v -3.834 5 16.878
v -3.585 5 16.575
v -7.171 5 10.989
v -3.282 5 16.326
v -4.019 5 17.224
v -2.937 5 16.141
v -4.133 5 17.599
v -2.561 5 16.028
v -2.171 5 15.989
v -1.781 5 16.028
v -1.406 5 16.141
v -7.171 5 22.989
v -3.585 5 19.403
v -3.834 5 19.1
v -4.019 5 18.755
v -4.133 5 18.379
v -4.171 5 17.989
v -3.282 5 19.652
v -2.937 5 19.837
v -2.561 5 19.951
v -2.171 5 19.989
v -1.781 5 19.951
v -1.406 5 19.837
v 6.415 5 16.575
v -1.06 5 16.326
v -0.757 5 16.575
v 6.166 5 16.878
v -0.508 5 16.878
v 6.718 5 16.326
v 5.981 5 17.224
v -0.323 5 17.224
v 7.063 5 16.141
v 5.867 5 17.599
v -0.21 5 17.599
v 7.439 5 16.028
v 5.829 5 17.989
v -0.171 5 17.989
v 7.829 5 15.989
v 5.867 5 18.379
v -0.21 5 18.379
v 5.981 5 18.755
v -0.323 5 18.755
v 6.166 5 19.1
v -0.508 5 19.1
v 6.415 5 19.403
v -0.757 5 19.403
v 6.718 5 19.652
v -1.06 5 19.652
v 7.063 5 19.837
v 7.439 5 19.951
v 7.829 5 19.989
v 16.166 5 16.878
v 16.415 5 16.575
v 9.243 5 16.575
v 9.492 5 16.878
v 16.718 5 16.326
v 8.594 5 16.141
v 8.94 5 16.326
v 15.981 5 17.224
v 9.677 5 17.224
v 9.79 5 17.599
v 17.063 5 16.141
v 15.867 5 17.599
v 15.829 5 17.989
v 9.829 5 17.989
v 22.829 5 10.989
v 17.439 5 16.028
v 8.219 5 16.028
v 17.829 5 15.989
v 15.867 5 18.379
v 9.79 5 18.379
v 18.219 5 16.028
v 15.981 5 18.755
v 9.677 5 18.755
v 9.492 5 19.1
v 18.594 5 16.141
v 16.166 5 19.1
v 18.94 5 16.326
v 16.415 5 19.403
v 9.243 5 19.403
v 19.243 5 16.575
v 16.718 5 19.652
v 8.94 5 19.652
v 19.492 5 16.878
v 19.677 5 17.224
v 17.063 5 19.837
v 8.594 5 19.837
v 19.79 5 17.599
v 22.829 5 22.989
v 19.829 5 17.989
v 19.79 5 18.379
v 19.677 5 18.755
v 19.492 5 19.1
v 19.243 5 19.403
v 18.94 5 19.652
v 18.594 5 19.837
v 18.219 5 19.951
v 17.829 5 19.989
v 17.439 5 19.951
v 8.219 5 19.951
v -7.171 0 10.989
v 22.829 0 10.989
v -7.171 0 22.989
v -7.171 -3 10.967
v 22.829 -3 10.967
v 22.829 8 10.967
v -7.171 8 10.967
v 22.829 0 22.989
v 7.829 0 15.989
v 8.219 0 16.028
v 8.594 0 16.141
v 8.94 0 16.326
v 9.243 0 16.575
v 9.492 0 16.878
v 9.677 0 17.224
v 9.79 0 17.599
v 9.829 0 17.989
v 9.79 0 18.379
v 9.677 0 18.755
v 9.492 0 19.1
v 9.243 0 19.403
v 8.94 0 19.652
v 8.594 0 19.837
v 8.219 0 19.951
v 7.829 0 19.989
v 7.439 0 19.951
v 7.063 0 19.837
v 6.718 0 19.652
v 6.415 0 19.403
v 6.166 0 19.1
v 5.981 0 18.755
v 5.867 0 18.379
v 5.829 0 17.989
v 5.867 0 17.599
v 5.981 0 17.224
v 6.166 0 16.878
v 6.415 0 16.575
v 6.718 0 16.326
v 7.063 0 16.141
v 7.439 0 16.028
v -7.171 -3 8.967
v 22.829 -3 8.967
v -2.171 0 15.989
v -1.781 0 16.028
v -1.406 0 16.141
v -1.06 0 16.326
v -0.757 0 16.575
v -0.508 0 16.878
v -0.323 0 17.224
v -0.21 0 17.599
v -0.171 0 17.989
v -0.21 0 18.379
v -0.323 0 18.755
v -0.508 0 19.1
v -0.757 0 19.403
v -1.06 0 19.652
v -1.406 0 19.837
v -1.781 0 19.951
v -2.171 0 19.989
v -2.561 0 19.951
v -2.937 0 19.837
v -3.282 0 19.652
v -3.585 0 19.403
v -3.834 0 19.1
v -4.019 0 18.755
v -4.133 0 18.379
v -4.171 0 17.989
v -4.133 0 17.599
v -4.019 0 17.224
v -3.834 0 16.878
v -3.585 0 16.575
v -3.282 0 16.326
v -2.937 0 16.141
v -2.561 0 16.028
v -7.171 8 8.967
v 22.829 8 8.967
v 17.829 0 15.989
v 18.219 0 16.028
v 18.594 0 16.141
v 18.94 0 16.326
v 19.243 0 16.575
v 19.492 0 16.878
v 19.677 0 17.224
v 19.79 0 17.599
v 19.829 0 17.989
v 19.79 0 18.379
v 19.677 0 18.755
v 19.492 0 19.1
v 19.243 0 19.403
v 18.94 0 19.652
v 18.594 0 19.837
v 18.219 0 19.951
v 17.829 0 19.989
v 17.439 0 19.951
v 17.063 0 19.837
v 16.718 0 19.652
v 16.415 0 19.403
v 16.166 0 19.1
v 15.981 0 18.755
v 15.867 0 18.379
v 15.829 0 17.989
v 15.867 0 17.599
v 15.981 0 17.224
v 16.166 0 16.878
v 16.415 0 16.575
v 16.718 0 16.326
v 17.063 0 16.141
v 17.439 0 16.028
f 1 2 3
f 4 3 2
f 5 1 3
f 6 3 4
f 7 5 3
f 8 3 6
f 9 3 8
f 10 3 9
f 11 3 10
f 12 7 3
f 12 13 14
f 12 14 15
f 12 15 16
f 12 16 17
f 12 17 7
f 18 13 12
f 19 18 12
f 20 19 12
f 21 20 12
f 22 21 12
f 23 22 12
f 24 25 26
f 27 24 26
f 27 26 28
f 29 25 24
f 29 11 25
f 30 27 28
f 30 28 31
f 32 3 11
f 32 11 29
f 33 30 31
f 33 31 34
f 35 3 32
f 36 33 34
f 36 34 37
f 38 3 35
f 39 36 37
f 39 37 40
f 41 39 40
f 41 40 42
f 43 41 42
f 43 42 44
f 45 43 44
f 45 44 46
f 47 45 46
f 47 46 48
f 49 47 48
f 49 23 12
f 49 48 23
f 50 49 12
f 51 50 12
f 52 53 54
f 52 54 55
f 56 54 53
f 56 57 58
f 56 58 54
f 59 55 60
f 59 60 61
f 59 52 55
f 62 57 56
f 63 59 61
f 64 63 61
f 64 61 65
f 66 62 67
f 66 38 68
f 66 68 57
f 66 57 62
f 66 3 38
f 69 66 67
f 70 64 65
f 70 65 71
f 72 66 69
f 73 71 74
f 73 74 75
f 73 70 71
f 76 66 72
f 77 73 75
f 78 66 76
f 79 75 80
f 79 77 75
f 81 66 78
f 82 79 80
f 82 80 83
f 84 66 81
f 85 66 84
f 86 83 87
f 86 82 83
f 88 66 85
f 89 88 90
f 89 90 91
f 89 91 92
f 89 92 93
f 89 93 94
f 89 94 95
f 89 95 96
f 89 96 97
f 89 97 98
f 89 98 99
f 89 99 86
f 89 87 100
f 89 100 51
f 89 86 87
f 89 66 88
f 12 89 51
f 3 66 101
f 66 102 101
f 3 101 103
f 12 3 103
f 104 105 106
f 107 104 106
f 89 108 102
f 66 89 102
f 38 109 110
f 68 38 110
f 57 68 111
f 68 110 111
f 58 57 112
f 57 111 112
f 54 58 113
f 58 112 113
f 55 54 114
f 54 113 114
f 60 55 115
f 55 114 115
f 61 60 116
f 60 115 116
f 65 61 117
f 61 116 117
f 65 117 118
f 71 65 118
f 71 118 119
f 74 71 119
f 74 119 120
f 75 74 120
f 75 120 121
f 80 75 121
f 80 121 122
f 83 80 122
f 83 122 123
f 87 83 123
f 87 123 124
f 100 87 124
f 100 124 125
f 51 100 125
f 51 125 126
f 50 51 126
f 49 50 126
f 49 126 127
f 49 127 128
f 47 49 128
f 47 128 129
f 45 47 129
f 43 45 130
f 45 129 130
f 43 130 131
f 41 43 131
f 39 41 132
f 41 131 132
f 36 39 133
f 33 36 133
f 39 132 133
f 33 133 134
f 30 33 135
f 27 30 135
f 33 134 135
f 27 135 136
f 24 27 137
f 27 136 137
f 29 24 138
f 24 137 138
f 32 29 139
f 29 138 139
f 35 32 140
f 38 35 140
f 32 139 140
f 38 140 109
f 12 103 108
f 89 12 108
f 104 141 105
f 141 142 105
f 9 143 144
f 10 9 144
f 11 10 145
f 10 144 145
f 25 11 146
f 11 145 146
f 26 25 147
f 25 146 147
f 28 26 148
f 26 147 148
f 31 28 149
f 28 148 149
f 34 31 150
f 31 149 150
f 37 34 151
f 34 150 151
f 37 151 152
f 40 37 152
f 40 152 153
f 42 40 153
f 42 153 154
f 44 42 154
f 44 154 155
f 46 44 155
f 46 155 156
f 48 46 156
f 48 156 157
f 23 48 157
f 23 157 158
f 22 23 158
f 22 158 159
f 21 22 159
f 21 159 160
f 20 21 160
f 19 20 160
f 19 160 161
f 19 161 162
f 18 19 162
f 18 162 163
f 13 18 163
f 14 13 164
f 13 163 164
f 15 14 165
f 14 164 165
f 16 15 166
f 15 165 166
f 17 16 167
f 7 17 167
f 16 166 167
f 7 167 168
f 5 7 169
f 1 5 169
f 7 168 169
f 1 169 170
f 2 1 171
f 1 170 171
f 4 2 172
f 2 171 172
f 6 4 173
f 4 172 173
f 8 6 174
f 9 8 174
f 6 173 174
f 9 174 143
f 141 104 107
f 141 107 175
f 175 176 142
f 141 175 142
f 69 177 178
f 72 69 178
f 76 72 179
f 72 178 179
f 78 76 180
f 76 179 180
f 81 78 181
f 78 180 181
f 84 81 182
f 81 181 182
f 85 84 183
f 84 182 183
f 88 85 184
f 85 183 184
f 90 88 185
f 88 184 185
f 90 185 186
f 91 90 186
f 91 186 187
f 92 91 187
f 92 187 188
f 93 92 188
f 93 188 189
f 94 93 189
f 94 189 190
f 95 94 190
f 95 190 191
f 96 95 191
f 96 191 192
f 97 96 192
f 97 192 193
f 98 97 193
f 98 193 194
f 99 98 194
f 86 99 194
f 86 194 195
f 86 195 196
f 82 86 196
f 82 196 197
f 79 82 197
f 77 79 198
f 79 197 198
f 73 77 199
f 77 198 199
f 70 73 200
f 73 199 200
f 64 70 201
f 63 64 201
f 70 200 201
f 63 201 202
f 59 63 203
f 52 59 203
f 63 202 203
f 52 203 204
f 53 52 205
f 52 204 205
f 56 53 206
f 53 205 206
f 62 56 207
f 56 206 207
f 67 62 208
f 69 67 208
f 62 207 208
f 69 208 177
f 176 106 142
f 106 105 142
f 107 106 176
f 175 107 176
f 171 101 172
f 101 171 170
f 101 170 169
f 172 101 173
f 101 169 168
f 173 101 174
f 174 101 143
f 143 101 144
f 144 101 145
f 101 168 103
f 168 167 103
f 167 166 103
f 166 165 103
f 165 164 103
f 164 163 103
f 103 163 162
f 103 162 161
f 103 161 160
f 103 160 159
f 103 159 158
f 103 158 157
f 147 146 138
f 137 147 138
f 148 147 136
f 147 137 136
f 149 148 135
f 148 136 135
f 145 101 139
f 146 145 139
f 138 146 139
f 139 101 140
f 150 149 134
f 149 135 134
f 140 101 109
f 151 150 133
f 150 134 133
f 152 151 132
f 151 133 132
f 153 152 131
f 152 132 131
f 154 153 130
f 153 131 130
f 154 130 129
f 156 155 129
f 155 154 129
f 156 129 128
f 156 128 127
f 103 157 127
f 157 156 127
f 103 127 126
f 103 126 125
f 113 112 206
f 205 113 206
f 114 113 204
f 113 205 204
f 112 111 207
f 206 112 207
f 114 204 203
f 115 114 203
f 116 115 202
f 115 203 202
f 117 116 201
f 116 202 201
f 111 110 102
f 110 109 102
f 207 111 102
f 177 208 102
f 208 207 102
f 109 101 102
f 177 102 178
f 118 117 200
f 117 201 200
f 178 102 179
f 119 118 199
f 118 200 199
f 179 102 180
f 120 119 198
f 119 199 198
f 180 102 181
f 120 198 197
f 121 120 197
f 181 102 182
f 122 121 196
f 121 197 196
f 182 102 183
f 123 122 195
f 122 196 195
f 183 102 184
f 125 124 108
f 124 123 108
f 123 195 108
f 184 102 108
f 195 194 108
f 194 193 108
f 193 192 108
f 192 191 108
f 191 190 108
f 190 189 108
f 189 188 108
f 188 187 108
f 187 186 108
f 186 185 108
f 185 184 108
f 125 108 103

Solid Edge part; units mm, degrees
sketch "Sketch1" plane through (0, 0, 0) normal (0, -1, 0) x (1, 0, 0)
  line L0 (-7.1712, 22.9892) -> (22.8288, 22.9892)
  line L1 (22.8288, 22.9892) -> (22.8288, 10.9892)
  line L2 (22.8288, 10.9892) -> (-7.1712, 10.9892)
  line L3 (-7.1712, 10.9892) -> (-7.1712, 22.9892)
  dimension "D1" = 30
  dimension "D2" = 12
extrude "Protrusion1" add sketch "Sketch1" against normal blind 5
hole "Bohrung_1" at (-2.1712, 0, 17.9892) direction (0, 1, 0) diameter 4 end up to next
hole "Hole1" at (7.8288, 0, 17.9892) direction (0, 1, 0) diameter 4 end up to next
hole "Hole2" at (17.8288, 0, 17.9892) direction (0, 1, 0) diameter 4 end up to next
sketch "Sketch2" plane through (22.8288, 2.5, 15.9892) normal (1, 0, 0) x (0, 1, 0)
  line L0 (-5.5, -5.0226) -> (5.5, -5.0226)
  line L1 (5.5, -5.0226) -> (5.5, -7.0226)
  line L2 (5.5, -7.0226) -> (-5.5, -7.0226)
  line L3 (-5.5, -7.0226) -> (-5.5, -5.0226)
  dimension "D1" = 3
  dimension "D2" = 3
  dimension "D3" = 2
extrude "Protrusion2" add sketch "Sketch2" against normal up to vertex (30 mm away)
